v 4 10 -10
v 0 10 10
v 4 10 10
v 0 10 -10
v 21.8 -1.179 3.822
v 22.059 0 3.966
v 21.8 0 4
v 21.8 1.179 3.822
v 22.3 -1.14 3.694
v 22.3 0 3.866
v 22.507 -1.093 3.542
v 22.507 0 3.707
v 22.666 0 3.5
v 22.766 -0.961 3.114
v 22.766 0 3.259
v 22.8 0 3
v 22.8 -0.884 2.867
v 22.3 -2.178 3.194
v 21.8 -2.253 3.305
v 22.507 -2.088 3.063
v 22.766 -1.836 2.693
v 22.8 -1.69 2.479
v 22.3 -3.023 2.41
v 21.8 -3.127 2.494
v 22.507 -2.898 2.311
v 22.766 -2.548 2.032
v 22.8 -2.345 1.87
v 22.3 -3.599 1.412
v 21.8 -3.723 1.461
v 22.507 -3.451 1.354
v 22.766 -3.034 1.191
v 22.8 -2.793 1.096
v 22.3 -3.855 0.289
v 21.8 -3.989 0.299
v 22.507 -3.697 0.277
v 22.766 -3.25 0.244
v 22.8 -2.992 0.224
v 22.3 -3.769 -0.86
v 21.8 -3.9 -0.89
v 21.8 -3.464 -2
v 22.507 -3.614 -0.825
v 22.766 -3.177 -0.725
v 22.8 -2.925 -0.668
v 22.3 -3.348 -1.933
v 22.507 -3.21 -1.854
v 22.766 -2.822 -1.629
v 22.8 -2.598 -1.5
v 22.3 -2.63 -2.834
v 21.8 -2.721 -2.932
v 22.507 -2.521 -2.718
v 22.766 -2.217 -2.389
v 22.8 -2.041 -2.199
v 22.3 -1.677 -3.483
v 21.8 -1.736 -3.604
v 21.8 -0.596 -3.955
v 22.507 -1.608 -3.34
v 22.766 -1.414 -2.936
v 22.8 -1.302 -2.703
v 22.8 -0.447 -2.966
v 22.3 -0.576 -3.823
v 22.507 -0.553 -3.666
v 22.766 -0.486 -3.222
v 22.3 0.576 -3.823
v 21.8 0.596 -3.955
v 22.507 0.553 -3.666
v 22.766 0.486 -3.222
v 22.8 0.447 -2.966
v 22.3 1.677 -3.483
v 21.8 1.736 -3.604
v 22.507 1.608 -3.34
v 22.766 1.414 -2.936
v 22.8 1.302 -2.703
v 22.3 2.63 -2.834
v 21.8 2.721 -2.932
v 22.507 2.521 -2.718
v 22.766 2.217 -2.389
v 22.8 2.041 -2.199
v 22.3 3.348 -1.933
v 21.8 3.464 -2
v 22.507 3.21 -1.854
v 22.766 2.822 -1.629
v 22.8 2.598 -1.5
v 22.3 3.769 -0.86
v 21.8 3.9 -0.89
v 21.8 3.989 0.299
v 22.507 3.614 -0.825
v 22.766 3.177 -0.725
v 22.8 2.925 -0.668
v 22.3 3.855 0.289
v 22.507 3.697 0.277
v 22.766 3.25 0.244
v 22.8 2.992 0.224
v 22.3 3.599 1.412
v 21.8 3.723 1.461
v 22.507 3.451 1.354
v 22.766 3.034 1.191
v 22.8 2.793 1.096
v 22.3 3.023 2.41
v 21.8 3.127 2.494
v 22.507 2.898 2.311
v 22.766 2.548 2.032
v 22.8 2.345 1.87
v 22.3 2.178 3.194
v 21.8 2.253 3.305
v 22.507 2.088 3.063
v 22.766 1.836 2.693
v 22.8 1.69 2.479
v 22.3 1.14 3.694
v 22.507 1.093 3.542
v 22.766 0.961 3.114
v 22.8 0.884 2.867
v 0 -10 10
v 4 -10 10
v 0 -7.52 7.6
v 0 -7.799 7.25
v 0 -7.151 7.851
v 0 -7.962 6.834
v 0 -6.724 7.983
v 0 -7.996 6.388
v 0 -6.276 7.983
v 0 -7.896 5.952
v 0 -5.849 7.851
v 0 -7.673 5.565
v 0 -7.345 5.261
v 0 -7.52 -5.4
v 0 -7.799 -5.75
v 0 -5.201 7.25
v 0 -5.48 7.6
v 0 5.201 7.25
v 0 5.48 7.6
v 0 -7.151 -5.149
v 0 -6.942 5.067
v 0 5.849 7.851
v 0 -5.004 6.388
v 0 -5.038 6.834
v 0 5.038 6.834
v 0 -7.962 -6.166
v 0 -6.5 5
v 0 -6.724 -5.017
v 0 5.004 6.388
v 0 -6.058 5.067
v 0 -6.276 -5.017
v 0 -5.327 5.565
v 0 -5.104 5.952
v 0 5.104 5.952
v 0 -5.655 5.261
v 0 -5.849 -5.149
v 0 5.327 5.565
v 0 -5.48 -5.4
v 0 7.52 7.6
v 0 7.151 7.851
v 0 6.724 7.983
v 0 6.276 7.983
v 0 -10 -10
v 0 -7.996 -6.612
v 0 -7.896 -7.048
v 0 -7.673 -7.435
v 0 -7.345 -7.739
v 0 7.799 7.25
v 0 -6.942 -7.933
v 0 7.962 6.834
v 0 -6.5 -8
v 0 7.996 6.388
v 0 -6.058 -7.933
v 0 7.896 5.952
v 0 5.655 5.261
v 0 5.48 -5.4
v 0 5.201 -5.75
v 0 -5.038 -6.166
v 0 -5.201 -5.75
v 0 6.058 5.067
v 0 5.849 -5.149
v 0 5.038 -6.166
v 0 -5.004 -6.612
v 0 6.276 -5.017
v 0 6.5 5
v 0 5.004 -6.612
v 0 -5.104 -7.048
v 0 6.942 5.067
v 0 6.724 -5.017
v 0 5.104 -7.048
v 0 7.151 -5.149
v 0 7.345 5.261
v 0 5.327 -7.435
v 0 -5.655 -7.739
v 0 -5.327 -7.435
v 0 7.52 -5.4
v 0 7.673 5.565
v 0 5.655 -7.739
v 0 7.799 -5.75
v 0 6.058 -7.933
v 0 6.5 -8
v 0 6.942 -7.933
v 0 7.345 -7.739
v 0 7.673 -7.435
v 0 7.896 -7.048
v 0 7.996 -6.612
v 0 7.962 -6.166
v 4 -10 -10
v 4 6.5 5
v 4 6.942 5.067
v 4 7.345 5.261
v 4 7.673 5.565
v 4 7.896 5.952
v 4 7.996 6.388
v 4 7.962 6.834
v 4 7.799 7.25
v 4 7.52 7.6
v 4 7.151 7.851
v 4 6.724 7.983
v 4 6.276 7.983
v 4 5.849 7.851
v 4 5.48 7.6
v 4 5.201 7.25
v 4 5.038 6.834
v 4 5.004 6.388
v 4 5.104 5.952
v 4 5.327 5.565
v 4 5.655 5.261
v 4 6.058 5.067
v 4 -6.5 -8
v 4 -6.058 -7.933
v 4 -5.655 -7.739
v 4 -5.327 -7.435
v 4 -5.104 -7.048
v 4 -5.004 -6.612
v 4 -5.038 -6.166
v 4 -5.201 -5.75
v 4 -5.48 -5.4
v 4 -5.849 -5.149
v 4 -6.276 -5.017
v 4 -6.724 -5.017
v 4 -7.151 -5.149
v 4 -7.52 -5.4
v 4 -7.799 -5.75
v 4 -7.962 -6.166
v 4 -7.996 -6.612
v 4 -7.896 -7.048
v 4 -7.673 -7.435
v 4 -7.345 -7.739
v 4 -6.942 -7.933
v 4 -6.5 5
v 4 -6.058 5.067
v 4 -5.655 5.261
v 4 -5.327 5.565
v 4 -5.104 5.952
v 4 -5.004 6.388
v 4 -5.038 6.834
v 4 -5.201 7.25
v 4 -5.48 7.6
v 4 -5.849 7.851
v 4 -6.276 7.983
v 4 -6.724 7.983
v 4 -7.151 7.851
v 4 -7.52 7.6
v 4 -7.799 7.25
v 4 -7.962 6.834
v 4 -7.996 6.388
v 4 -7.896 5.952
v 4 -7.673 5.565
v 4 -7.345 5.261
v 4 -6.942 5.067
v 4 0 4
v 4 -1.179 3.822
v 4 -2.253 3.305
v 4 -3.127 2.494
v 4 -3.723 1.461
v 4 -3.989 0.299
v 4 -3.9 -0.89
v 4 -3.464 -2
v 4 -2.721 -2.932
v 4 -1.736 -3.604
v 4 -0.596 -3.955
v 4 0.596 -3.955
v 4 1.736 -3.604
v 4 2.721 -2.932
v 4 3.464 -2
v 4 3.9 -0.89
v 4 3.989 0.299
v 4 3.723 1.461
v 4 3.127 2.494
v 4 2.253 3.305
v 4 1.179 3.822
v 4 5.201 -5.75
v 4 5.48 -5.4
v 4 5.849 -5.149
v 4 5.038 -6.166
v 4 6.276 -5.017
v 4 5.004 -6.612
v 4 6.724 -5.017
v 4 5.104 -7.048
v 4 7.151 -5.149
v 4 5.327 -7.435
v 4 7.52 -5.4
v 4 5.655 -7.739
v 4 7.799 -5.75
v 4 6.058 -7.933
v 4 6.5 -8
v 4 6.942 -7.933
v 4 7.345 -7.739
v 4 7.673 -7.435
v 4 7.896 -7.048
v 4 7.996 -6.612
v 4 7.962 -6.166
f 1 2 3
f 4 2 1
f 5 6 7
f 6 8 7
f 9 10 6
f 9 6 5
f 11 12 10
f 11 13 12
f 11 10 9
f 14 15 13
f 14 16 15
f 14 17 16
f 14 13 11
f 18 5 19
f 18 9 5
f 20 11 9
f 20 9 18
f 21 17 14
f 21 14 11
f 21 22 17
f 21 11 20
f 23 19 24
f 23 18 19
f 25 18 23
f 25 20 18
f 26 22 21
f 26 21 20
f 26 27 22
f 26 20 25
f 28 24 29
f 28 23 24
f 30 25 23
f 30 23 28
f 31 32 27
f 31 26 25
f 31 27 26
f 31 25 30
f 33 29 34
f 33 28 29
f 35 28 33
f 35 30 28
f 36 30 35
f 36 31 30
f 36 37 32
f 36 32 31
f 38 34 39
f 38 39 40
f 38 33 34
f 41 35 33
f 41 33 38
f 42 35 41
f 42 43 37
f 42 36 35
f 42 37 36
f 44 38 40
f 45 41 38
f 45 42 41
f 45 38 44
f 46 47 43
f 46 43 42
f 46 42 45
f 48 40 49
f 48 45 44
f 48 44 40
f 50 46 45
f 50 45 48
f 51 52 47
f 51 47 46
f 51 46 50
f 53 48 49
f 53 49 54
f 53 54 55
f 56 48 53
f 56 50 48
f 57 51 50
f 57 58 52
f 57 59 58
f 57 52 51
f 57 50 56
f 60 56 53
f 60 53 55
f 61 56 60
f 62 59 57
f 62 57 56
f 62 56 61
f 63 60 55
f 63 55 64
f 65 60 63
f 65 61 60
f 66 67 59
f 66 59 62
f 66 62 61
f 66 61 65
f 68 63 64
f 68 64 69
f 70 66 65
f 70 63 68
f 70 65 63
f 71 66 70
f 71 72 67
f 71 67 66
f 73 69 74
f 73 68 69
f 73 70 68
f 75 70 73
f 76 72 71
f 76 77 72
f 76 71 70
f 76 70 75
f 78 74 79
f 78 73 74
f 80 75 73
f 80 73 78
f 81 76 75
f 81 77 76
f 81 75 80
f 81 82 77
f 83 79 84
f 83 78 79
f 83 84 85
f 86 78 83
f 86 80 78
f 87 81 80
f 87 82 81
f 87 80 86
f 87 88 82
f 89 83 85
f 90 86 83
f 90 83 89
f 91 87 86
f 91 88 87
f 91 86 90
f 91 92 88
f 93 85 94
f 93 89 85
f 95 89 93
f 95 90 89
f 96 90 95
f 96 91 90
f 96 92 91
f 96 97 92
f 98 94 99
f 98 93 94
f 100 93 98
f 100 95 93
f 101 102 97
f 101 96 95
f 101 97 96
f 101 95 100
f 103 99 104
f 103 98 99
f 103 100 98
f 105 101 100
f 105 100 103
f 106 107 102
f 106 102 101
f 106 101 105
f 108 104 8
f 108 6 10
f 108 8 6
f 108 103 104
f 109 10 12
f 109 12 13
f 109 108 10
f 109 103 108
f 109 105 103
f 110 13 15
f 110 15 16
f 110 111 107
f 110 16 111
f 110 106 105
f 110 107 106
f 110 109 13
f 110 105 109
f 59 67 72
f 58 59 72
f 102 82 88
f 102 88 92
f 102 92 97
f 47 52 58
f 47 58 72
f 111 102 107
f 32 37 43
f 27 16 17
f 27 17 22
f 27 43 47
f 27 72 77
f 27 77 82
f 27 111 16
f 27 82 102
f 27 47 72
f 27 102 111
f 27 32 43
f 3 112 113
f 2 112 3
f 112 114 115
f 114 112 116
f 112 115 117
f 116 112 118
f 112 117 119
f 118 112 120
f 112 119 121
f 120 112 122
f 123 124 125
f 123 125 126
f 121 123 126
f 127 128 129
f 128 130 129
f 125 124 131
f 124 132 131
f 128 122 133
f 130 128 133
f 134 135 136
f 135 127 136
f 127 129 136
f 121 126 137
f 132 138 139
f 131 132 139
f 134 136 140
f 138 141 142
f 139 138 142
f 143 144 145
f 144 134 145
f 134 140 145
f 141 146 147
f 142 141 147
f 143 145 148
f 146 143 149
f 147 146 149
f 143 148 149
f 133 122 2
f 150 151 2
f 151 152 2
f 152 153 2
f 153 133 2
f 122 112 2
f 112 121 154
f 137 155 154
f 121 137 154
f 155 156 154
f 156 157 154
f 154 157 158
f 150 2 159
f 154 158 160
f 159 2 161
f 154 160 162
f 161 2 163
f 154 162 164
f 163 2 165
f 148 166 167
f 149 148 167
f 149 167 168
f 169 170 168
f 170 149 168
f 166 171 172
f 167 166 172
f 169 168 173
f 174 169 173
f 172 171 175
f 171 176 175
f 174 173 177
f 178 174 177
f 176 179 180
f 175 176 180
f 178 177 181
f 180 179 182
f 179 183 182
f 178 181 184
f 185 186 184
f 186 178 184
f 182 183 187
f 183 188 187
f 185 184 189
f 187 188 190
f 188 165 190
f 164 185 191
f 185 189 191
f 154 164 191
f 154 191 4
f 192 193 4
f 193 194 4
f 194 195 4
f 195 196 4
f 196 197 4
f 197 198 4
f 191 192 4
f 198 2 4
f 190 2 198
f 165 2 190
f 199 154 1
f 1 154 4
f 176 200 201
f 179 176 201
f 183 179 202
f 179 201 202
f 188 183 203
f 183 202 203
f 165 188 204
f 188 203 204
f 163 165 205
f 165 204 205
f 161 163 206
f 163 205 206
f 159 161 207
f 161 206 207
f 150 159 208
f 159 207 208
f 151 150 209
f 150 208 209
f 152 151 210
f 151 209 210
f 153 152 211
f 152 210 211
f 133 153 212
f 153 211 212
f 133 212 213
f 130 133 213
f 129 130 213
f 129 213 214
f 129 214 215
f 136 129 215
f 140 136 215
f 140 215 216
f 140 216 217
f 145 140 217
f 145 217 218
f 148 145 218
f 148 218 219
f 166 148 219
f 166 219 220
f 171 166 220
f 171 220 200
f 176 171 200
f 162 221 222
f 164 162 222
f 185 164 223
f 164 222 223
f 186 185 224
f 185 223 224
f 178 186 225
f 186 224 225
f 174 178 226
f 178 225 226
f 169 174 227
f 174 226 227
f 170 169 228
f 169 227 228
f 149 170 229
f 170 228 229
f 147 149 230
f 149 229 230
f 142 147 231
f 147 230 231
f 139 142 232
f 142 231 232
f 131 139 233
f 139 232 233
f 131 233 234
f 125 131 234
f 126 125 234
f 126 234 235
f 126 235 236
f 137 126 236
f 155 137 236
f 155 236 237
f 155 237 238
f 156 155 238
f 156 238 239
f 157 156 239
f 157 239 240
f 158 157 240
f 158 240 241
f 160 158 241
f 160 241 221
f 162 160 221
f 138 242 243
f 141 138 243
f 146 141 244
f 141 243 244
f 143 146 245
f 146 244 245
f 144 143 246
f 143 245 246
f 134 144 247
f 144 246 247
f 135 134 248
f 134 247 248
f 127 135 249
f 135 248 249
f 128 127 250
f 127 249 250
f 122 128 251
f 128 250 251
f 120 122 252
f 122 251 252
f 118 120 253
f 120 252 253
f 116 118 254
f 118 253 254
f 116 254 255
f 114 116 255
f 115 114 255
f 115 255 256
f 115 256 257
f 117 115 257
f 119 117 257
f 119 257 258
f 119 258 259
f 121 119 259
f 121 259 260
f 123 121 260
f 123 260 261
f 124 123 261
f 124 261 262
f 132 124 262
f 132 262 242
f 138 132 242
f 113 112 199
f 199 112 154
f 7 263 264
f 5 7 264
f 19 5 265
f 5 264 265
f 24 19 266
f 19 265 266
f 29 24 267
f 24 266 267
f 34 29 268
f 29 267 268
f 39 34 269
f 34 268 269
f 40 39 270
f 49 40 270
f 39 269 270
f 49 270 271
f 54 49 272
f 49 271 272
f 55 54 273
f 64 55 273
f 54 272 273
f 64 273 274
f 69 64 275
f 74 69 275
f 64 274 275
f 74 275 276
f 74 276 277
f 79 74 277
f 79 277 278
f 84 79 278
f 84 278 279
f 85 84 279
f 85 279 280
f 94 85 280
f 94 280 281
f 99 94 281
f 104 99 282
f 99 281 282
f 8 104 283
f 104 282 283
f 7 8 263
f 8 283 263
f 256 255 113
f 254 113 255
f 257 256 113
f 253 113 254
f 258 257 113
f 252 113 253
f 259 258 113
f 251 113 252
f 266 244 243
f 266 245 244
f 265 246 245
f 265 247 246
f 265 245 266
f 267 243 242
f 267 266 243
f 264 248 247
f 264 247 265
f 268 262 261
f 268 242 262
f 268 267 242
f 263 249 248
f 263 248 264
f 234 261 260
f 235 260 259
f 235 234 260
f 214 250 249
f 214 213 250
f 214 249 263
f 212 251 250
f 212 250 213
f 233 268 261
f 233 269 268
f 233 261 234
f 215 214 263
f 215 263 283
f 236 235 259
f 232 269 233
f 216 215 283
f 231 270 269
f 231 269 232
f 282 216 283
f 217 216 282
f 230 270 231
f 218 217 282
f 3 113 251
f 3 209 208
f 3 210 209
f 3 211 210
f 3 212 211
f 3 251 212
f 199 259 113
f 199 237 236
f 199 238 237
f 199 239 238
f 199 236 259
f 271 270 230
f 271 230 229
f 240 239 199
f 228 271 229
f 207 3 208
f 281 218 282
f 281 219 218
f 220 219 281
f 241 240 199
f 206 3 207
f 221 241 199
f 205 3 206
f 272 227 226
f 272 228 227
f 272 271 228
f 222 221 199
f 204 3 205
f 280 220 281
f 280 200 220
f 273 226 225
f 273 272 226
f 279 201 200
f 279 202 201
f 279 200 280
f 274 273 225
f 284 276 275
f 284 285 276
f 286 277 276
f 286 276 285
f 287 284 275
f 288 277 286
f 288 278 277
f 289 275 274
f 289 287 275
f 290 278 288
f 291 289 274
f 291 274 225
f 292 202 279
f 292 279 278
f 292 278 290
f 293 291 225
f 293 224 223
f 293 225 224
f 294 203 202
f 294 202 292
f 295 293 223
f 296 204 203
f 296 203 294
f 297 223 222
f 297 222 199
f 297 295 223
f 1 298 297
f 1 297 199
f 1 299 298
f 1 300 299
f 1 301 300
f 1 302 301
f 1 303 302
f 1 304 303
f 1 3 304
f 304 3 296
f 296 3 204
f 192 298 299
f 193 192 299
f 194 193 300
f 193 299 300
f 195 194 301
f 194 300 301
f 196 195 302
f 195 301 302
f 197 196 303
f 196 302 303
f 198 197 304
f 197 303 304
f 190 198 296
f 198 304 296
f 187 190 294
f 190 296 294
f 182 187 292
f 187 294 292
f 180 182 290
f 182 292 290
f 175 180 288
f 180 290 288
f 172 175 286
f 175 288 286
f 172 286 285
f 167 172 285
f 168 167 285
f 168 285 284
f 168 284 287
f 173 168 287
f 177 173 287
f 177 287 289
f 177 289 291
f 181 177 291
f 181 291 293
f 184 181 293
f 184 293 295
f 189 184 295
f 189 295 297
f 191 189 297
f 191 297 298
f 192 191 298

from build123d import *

# Parameters (mm, degrees)
SKETCH1_W             = 20
SKETCH1_H             = 20
BOSS_EXTRUDE1_DEPTH   = 4
SKETCH2_R             = 4
BOSS_EXTRUDE2_DEPTH   = 18.8
F_3_0MM_DOWEL_HOLE1_D = 3
FILLET1_R             = 1


with BuildPart() as part:
    # Sketch1 → Boss-Extrude1 (new body)
    with BuildSketch(Plane(origin=(0, 0, 0), x_dir=(0, 0, -1), z_dir=(1, 0, 0))):
        Rectangle(SKETCH1_W, SKETCH1_H)
    extrude(amount=BOSS_EXTRUDE1_DEPTH)

    # Sketch2 → Boss-Extrude2 (add)
    with BuildSketch(Plane(origin=(4, 0, 0), x_dir=(0, 0, -1), z_dir=(1, 0, 0))):
        with Locations(Location((0, 0, 0), (0, 0, 180))):
            Circle(SKETCH2_R)
    extrude(amount=BOSS_EXTRUDE2_DEPTH)

    # Ø3.0mm Dowel Hole1 (through all)
    with Locations(Plane.ZY):
        with Locations((-6.5, -6.5), (-6.5, 6.5), (6.5, 6.5), (6.5, -6.5)):
            Hole(F_3_0MM_DOWEL_HOLE1_D / 2)

    # Fillet1
    fillet1_edges = [part.edges().sort_by_distance(p)[0] for p in [
        (22.8, 0, -4),
    ]]
    fillet(fillet1_edges, radius=FILLET1_R)


solid = part.part
